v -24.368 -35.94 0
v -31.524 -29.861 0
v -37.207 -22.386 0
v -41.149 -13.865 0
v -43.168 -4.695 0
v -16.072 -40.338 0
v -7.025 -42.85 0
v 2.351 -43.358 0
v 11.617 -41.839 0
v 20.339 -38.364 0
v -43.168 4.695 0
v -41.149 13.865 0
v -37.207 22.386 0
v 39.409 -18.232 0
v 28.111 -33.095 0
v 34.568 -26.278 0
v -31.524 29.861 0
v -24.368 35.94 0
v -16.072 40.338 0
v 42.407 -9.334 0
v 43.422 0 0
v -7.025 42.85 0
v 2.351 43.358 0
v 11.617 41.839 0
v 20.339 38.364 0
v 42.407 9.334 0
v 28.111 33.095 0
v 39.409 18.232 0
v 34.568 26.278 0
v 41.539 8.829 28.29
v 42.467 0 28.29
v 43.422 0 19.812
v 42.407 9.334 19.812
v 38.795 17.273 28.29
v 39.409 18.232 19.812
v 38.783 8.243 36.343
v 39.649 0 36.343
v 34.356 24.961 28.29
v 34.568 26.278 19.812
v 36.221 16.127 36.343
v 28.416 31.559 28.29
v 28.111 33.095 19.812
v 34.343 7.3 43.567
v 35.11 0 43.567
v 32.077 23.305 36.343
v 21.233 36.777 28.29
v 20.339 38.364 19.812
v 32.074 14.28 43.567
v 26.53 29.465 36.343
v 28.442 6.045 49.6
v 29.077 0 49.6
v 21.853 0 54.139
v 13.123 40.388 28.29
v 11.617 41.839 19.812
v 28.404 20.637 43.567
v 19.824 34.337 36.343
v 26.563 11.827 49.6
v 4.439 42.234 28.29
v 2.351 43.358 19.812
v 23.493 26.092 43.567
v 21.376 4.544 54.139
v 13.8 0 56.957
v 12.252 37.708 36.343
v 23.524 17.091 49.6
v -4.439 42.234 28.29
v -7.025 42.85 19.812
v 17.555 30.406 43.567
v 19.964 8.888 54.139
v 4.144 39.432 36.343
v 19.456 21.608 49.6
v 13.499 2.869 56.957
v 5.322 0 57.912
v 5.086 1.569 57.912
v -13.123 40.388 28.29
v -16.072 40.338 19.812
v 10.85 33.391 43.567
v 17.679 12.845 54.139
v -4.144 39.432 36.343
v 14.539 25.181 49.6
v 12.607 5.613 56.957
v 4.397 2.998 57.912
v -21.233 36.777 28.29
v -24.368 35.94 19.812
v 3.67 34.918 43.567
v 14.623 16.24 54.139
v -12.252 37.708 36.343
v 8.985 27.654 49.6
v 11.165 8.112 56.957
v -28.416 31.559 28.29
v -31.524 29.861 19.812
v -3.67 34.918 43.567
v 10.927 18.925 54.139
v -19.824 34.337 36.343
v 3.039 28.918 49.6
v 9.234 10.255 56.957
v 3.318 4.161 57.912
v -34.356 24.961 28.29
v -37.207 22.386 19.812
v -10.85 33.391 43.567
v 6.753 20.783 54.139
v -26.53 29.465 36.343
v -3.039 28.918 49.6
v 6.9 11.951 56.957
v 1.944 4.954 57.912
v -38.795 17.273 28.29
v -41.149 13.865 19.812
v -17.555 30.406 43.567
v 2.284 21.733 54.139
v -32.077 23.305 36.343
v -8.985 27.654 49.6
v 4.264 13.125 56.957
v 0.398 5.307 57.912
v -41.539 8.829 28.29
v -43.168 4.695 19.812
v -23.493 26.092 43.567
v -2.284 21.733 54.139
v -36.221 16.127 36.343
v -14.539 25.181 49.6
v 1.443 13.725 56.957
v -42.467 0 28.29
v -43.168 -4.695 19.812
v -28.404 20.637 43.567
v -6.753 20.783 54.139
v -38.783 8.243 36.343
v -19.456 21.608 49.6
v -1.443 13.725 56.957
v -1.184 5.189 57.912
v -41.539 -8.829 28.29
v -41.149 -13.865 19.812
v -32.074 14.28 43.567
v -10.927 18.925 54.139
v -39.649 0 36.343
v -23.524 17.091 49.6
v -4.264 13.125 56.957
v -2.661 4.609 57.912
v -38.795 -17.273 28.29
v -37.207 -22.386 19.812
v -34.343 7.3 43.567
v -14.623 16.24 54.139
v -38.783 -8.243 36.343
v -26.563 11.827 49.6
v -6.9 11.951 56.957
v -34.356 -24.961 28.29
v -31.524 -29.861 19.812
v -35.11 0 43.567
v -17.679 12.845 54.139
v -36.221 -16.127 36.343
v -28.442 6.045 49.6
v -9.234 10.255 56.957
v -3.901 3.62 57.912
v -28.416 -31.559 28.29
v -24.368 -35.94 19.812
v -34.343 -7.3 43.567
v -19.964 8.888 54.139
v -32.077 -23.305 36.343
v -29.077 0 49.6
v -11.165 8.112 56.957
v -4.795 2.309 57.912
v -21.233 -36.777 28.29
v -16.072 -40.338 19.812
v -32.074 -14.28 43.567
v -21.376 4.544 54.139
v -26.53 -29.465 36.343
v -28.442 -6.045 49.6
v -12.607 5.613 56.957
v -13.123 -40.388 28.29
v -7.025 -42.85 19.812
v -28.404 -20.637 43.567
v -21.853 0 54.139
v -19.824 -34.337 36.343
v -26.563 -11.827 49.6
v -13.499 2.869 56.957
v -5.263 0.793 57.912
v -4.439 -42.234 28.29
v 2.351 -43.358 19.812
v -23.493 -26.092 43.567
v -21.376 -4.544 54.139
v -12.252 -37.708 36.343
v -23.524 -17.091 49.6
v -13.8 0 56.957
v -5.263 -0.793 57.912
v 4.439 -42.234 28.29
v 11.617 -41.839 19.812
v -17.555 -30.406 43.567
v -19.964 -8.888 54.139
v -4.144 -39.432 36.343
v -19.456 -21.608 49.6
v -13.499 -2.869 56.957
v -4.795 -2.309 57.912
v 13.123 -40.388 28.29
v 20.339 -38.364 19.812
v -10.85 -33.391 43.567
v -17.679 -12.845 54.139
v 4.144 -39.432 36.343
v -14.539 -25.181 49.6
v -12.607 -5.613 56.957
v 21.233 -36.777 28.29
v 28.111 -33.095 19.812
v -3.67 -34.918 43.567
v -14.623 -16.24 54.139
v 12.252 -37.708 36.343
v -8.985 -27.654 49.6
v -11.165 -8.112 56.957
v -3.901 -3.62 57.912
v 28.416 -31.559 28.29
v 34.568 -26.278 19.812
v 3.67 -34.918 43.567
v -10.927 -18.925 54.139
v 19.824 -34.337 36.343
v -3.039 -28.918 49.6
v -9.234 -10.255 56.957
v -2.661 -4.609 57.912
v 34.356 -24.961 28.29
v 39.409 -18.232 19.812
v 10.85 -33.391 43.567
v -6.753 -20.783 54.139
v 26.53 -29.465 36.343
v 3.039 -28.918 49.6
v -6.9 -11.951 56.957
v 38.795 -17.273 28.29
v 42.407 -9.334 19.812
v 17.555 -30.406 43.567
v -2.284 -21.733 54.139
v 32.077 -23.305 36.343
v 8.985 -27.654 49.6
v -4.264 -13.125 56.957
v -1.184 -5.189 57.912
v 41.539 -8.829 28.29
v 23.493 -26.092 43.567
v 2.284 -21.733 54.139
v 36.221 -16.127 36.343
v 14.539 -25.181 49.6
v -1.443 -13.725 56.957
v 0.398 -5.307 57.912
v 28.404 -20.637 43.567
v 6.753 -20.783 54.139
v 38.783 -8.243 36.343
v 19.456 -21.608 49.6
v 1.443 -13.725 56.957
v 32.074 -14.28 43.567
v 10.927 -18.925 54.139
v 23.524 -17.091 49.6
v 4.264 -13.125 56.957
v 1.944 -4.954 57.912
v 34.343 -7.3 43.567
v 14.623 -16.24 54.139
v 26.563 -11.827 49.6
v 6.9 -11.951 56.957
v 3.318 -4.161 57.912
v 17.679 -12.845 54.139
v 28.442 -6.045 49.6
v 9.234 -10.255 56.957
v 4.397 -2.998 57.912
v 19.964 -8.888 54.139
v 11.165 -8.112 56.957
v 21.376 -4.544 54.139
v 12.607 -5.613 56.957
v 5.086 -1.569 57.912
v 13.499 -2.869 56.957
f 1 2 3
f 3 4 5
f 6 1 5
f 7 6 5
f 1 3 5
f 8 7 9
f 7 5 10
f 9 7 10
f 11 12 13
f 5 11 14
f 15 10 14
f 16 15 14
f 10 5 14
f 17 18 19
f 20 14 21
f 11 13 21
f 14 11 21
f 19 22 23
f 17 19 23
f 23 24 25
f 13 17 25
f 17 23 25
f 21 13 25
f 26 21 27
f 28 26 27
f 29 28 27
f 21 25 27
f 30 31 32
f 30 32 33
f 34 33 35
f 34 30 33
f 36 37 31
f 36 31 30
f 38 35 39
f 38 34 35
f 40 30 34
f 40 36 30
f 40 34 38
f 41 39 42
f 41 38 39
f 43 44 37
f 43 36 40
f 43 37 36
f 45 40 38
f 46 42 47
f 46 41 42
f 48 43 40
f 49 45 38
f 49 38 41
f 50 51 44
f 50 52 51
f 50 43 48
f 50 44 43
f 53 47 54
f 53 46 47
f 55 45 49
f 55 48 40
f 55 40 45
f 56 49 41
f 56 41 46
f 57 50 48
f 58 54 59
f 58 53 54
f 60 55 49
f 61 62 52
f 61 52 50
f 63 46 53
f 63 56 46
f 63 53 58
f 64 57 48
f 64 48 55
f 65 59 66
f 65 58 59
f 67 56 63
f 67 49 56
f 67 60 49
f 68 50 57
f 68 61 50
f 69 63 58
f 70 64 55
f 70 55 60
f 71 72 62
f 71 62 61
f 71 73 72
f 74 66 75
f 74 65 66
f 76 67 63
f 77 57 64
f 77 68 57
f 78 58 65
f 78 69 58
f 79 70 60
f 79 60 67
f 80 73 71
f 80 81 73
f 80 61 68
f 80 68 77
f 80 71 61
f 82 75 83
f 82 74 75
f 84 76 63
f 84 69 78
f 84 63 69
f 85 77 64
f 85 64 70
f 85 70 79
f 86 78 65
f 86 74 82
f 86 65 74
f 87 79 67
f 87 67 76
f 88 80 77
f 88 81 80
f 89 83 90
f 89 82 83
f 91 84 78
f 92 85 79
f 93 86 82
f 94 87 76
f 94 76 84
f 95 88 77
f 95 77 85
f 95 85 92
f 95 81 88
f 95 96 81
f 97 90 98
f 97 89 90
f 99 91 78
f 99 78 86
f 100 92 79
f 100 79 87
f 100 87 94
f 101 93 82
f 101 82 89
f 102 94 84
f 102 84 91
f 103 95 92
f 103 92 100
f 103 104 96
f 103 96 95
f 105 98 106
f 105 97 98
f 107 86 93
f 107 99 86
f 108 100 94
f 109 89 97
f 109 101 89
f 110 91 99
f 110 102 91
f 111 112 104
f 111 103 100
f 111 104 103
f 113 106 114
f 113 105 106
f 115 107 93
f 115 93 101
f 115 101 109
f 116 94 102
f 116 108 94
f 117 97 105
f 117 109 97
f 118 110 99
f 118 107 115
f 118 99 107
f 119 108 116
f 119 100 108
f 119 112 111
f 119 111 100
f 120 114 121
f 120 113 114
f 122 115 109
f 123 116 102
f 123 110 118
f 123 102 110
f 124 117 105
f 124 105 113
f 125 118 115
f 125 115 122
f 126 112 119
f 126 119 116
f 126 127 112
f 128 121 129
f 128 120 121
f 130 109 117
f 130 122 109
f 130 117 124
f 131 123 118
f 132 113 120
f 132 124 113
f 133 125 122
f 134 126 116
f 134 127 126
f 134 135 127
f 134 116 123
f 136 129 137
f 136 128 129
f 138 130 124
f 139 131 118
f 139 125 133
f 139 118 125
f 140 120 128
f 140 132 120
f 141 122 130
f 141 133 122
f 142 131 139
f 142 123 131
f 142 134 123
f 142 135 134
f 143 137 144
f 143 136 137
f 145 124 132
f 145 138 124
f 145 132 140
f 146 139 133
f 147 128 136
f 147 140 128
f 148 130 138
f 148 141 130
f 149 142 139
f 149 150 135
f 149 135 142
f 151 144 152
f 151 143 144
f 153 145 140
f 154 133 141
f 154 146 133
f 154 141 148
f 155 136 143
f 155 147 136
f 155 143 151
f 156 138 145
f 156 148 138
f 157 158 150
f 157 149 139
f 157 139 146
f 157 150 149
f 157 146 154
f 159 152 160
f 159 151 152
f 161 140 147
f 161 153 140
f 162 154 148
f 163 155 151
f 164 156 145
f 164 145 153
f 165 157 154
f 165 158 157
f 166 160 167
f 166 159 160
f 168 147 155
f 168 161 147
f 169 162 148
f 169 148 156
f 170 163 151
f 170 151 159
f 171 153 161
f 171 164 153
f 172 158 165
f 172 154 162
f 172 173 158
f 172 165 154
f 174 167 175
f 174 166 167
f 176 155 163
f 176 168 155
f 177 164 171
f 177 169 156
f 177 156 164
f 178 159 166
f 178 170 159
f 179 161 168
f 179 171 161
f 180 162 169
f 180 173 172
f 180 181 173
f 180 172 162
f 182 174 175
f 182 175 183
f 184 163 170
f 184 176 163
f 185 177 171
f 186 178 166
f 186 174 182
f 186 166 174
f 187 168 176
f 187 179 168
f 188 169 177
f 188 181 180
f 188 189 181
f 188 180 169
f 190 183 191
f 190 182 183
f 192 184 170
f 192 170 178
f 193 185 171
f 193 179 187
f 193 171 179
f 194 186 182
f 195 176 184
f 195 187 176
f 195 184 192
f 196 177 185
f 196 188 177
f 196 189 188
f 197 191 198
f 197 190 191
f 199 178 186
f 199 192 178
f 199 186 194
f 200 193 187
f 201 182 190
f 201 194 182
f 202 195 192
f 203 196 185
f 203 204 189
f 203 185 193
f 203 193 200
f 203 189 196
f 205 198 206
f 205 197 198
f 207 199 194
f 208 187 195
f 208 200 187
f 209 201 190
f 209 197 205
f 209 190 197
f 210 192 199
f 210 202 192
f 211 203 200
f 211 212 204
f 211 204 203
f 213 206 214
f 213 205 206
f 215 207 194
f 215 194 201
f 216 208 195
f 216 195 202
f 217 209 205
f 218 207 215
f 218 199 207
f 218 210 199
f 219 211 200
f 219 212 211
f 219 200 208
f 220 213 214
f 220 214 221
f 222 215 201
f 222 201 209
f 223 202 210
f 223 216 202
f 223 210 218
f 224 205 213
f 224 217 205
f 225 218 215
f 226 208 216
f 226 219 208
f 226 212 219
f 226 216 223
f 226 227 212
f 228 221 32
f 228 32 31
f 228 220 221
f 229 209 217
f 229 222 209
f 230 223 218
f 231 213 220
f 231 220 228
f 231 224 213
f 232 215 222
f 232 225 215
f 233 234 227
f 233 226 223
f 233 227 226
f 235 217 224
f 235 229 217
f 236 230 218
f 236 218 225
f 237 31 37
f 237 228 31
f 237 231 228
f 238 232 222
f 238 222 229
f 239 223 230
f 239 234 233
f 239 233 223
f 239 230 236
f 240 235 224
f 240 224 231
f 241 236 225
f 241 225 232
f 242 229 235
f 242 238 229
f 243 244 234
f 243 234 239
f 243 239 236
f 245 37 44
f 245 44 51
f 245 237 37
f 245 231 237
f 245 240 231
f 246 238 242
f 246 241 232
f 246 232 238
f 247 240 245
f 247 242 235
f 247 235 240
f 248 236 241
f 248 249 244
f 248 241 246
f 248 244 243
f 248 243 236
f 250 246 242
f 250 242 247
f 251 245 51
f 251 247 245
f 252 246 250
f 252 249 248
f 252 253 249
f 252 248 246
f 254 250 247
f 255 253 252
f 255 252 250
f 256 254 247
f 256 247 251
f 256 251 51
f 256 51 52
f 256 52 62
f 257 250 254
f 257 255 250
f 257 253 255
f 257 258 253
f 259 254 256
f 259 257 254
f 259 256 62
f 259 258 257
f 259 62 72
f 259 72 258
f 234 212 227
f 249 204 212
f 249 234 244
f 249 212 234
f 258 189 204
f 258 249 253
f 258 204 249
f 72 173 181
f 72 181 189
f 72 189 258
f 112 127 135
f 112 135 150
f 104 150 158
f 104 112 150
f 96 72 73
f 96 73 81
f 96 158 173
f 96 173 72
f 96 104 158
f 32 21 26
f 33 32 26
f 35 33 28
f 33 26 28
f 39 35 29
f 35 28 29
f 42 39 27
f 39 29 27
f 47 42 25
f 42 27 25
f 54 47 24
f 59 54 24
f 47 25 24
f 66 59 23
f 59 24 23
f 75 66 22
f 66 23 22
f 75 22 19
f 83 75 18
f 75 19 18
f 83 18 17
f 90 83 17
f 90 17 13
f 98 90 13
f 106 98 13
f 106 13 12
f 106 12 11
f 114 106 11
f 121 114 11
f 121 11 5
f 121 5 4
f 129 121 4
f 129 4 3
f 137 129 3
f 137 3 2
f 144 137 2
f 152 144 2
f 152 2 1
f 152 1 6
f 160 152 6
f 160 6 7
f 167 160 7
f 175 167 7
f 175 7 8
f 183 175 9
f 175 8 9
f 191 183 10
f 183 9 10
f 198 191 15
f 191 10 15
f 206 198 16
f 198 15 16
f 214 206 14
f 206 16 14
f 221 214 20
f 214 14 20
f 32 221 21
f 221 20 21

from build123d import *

# Parameters (mm, degrees)
F0_R     = 43.4220747745
F1_DEPTH = 25.4
F2_DEPTH = 32.512
F3_R     = 38.1


with BuildPart() as f1:
    # F0 (on Top) → F1 (new body)
    with BuildSketch(Plane.XY):
        Circle(F0_R)
    extrude(amount=F1_DEPTH)

    # F2 (add): a face of the model
    f2_faces = [f1.faces().sort_by_distance(p)[0] for p in [
        (0, 0, 25.4),
    ]]
    extrude(f2_faces, amount=F2_DEPTH)

    # F3
    f3_edges = [f1.edges().sort_by_distance(p)[0] for p in [
        (-43.422075, 0, 57.912),
    ]]
    fillet(f3_edges, radius=F3_R)


solid = f1.part
